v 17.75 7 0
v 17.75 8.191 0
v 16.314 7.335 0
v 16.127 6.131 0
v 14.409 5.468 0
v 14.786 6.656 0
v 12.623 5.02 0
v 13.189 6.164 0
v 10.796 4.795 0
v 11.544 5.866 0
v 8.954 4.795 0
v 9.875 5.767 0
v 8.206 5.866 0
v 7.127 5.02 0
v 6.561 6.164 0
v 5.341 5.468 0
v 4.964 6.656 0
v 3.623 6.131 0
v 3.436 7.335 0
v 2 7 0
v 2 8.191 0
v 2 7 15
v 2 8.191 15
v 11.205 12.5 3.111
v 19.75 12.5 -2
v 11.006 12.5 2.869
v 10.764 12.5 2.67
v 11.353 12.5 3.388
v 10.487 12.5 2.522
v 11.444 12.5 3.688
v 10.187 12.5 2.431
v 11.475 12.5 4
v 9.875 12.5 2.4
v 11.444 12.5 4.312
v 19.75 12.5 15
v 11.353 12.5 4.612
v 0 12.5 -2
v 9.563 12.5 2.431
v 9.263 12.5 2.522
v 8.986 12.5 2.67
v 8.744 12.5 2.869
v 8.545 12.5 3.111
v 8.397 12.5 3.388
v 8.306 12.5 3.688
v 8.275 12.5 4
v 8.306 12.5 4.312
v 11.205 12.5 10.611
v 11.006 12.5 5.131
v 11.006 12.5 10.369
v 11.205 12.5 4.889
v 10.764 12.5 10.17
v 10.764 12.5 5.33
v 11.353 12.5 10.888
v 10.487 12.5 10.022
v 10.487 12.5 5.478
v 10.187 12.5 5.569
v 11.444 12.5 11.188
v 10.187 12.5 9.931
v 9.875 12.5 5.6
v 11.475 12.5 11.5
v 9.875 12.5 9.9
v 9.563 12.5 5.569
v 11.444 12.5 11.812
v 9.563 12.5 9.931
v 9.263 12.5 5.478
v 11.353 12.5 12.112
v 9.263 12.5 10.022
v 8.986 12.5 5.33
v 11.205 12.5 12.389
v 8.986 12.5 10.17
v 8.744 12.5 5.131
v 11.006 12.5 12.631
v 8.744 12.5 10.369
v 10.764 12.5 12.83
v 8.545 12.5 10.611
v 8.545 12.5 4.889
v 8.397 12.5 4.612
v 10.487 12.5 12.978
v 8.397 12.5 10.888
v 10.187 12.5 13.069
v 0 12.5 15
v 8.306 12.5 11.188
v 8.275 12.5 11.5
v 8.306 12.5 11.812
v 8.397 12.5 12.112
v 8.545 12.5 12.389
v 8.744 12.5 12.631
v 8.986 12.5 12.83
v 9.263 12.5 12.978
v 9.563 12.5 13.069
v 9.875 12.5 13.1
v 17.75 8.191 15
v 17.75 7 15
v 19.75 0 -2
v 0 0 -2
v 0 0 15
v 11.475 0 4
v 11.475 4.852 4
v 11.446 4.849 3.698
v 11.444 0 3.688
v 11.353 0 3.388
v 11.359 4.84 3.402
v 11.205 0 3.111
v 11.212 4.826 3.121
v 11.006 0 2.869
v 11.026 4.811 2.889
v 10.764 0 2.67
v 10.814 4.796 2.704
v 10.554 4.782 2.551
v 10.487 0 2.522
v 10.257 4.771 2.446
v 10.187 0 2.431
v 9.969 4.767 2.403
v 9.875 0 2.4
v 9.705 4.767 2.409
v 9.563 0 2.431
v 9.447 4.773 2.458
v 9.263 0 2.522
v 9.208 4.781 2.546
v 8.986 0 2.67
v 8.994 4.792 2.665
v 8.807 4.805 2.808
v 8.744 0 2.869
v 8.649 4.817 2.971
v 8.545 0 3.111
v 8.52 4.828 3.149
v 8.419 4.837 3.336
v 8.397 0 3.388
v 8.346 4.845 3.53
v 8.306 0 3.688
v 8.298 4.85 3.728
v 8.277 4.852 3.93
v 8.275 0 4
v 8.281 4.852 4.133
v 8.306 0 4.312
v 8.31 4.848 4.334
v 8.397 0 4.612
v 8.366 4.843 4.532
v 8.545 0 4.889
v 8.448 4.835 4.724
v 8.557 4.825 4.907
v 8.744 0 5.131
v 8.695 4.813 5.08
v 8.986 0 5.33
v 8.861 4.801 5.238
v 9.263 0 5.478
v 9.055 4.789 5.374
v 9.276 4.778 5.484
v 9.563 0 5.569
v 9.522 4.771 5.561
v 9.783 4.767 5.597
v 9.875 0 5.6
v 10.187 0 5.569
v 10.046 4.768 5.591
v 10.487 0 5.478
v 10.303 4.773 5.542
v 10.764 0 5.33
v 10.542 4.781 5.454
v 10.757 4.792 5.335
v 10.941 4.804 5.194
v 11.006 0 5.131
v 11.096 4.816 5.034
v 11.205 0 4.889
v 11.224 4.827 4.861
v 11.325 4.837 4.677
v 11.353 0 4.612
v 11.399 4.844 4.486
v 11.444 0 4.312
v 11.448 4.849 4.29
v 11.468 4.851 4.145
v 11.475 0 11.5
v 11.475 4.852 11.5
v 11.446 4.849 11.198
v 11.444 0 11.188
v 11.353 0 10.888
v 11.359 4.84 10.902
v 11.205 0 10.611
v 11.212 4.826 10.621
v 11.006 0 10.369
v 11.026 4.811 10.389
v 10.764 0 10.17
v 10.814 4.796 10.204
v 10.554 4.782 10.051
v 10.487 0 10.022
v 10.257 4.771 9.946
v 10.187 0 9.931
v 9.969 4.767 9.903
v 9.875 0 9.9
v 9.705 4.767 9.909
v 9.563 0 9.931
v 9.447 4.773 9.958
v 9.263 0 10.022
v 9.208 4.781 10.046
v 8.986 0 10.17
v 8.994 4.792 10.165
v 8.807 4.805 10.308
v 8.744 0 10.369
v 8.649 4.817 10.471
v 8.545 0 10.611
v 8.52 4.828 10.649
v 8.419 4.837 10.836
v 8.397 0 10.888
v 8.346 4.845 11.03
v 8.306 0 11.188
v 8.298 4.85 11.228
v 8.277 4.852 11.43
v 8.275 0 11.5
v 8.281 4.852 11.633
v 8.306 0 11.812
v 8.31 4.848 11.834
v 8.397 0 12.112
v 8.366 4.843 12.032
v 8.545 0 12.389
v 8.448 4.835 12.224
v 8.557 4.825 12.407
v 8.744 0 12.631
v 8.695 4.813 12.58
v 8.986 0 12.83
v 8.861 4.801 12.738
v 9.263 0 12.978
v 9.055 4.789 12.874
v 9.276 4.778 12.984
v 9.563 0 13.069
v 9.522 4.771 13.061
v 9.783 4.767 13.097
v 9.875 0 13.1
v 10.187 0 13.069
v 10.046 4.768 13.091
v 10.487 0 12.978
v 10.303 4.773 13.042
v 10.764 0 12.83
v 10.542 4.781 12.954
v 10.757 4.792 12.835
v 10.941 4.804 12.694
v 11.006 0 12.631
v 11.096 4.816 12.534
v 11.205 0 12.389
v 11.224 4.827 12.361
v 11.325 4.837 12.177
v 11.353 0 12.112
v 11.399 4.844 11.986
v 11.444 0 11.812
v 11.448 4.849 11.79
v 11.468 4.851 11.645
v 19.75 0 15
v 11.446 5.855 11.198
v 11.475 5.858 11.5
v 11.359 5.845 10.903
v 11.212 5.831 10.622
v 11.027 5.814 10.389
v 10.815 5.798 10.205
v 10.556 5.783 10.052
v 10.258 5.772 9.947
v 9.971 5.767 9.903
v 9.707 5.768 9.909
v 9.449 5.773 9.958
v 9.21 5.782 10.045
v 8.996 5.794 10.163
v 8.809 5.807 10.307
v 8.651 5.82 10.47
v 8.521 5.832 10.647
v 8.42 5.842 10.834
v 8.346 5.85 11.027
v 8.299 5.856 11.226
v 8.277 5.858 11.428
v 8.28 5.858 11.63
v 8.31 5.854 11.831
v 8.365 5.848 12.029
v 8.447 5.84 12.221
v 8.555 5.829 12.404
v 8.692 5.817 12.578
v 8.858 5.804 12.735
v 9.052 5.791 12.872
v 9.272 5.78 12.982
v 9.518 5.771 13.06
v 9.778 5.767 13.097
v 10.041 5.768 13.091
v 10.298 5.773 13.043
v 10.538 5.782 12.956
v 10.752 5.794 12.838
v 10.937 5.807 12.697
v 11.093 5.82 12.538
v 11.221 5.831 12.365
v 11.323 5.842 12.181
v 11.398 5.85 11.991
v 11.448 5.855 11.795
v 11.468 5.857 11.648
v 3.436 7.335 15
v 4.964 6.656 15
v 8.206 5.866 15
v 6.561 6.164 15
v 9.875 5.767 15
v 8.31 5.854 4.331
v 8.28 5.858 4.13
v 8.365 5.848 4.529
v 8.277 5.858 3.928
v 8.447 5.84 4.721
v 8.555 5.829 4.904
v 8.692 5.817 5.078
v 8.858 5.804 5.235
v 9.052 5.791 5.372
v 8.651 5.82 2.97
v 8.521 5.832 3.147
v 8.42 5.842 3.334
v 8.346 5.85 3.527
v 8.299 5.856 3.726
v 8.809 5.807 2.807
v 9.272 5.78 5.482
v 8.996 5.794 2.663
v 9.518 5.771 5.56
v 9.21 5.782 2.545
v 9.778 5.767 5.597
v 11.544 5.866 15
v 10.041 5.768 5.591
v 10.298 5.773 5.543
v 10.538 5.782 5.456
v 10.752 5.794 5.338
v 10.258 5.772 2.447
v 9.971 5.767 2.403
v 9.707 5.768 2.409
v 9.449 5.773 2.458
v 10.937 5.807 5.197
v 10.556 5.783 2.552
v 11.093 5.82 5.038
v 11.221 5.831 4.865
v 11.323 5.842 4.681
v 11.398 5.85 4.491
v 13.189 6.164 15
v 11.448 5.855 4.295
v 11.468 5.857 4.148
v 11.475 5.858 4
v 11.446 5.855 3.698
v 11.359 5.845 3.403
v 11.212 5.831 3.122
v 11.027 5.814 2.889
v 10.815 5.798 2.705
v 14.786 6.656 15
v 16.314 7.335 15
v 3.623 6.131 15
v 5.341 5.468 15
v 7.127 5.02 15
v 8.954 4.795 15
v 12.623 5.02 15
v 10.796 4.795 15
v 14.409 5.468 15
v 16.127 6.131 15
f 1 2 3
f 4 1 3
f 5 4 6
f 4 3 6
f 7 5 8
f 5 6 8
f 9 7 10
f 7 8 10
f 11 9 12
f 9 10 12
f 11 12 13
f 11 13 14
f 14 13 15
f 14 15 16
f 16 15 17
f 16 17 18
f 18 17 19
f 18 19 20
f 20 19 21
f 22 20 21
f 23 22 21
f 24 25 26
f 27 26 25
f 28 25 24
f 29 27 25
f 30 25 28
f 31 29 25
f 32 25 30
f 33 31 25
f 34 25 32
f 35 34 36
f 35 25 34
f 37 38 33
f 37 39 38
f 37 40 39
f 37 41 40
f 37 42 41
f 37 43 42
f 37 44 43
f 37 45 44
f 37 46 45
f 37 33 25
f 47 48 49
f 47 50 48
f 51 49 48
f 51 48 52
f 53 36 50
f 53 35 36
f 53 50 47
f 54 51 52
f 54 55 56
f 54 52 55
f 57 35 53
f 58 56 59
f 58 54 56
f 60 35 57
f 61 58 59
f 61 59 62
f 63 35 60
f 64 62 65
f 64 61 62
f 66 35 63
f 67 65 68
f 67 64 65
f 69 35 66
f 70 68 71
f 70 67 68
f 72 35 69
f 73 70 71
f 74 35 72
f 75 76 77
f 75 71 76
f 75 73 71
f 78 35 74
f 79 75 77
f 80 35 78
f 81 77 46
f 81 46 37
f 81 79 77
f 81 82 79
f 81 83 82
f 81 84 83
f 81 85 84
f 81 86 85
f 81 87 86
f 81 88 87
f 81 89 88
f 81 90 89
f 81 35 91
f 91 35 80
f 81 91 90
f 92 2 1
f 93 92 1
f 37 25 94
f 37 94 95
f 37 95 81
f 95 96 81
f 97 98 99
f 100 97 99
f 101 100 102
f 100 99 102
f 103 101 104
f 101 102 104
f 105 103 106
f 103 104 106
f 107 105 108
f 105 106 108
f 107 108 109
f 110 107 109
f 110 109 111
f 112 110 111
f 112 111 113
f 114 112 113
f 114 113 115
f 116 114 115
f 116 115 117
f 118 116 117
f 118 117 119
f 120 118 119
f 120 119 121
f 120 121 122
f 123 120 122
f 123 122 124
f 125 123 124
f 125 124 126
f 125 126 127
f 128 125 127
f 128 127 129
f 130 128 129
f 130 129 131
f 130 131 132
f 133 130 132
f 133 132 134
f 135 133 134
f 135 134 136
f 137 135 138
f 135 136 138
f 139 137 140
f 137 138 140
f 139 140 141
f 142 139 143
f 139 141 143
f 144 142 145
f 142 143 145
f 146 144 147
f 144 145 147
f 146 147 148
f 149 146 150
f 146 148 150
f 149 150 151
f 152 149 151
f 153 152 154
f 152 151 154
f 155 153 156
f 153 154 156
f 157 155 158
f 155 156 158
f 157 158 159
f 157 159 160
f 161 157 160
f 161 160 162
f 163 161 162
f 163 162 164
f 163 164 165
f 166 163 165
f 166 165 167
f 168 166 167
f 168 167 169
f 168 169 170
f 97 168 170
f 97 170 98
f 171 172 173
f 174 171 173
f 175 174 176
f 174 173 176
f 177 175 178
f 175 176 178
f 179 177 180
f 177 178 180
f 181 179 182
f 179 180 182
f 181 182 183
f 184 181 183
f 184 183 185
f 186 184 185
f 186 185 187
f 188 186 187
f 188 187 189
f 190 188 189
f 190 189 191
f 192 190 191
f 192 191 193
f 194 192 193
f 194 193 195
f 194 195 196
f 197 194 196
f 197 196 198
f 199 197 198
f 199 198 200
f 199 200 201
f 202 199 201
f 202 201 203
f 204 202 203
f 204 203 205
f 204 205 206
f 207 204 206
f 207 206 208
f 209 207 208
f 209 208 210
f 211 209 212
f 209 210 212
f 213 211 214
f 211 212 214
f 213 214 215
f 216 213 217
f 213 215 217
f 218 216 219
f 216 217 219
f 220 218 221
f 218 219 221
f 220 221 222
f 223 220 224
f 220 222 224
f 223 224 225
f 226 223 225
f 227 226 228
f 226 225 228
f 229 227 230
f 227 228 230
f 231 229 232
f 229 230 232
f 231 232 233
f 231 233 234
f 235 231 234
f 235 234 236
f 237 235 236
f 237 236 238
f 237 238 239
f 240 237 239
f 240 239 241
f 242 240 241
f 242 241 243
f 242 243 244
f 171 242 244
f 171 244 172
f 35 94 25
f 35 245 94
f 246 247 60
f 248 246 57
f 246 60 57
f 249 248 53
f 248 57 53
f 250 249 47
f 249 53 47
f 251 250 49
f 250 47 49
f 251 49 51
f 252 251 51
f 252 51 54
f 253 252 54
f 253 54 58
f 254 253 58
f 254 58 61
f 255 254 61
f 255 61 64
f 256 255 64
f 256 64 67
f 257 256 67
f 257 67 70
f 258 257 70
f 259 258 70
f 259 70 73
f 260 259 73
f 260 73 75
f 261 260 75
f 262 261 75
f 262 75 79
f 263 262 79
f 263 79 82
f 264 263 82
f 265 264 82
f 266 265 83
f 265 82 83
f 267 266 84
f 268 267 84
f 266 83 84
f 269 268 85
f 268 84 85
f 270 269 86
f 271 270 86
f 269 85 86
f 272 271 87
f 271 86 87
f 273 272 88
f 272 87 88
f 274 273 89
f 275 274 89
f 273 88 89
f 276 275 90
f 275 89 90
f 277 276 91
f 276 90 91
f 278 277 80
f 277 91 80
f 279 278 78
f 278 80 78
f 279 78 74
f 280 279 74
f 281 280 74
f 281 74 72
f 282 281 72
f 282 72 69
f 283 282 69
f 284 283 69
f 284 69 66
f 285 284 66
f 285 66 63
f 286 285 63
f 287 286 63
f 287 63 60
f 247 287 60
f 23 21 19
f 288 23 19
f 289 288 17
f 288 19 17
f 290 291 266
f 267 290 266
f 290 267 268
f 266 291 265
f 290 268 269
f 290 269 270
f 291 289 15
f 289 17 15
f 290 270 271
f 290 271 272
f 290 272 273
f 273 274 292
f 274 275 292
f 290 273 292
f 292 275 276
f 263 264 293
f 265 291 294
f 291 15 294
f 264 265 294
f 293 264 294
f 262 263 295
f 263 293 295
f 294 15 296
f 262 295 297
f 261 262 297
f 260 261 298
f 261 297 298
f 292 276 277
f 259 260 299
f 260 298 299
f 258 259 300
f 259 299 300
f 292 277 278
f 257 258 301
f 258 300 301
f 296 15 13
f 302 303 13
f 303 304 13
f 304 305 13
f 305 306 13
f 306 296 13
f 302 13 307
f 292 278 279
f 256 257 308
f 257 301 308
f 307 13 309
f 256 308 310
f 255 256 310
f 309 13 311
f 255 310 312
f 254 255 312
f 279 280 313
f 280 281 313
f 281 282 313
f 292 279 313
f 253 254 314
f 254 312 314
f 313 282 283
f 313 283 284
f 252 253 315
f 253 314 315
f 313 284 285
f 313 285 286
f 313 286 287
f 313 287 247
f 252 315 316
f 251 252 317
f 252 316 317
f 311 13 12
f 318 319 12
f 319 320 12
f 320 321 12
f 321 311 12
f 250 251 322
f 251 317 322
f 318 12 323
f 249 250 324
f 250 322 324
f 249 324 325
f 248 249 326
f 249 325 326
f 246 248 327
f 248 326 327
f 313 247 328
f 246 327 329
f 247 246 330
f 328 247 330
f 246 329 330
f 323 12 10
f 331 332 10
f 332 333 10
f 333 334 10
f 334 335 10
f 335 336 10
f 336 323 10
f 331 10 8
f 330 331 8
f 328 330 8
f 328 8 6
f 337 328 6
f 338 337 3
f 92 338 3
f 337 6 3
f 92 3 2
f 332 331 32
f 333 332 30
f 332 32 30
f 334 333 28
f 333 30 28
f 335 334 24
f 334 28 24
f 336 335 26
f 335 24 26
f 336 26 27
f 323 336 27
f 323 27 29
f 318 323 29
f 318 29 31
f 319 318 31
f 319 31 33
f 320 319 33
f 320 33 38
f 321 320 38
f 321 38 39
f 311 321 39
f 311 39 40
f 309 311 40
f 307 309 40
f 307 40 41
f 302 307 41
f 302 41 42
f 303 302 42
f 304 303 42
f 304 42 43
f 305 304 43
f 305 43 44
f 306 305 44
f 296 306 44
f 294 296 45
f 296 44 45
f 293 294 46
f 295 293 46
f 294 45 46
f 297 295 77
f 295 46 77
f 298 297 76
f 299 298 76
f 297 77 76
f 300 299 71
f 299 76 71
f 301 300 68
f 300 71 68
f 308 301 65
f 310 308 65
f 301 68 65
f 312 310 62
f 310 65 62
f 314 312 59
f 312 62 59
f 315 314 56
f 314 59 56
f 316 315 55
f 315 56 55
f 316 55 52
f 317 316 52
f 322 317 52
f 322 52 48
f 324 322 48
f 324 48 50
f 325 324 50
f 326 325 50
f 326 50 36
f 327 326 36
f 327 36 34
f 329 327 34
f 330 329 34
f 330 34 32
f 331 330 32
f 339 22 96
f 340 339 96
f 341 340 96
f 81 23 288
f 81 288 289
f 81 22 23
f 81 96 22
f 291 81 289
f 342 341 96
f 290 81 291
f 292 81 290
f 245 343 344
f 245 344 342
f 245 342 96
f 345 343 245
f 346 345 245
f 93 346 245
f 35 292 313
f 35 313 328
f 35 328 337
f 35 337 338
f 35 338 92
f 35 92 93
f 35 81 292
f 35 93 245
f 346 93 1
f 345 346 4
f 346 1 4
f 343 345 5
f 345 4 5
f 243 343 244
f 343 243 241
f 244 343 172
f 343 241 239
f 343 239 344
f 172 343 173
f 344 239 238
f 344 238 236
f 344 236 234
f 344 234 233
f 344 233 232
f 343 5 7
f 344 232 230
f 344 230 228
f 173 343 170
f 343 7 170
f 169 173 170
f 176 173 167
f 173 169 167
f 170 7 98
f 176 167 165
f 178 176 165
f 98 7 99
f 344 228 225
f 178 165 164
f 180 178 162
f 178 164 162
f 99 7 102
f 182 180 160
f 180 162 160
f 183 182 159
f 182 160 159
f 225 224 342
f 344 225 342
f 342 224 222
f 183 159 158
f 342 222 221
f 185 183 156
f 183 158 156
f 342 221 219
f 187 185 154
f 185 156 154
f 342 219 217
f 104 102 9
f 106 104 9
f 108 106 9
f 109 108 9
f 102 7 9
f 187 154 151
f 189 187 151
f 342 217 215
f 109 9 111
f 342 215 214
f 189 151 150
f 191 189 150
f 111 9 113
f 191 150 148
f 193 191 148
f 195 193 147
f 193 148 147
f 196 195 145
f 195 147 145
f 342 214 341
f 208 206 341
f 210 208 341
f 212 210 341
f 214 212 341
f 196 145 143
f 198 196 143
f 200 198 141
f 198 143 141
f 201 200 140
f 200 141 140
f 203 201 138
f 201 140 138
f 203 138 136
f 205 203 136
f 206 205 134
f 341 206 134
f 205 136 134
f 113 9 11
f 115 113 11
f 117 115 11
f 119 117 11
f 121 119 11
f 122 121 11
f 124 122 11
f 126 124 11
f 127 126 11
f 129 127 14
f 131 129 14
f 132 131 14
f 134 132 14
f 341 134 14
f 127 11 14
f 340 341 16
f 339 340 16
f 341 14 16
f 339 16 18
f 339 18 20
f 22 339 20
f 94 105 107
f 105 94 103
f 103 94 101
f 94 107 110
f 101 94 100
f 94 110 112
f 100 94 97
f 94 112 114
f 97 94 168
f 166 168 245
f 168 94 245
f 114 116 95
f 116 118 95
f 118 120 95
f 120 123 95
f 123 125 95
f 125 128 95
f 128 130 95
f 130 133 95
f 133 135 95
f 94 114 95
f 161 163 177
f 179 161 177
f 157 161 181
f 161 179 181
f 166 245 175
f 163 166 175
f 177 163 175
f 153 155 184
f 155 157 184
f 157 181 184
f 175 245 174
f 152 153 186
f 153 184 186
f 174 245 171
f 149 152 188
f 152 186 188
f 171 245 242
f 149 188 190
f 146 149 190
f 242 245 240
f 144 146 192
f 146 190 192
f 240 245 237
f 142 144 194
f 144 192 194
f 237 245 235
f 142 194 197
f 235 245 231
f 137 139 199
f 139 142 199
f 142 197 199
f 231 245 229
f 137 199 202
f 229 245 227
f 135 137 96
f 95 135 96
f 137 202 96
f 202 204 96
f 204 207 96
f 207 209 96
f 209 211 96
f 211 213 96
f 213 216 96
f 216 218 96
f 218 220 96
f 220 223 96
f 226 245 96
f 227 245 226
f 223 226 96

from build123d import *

# Parameters (mm, degrees)
SKETCH1_W           = 19.75
SKETCH1_H           = 12.5
BOSS_EXTRUDE1_DEPTH = 15
SKETCH2_R           = 1.6
CUT_EXTRUDE1_DEPTH  = 13.5
SKETCH3_W           = 19.75
SKETCH3_H           = 12.5
BOSS_EXTRUDE2_DEPTH = 2


with BuildPart() as part:
    # Sketch1 → Boss-Extrude1 (new body)
    with BuildSketch(Plane.XY):
        with Locations((9.875, 6.25)):
            Rectangle(SKETCH1_W, SKETCH1_H)
        with BuildLine():
            Line((17.75, 8.191371412), (17.75, 7))
            ThreePointArc((17.75, 7), (9.875, 4.766533398), (2, 7))
            Line((2, 7), (2, 8.191371412))
            ThreePointArc((2, 8.191371412), (9.875, 5.766533398), (17.75, 8.191371412))
        make_face(mode=Mode.SUBTRACT)
    extrude(amount=BOSS_EXTRUDE1_DEPTH)

    # Sketch2 → Cut-Extrude1 (cut, through all)
    with BuildSketch(Plane(origin=(0, 12.5, 0), x_dir=(1, 0, 0), z_dir=(0, 1, 0))):
        with Locations((9.875, -11.5)):
            Circle(SKETCH2_R)
        with Locations((9.875, -4)):
            Circle(SKETCH2_R)
    extrude(amount=-CUT_EXTRUDE1_DEPTH, mode=Mode.SUBTRACT)

    # Sketch3 → Boss-Extrude2 (add)
    with BuildSketch(Plane(origin=(0, 0, 0), x_dir=(-1, 0, 0), z_dir=(0, 0, -1))):
        with Locations((-9.875, 6.25)):
            Rectangle(SKETCH3_W, SKETCH3_H)
    extrude(amount=BOSS_EXTRUDE2_DEPTH)


solid = part.part
